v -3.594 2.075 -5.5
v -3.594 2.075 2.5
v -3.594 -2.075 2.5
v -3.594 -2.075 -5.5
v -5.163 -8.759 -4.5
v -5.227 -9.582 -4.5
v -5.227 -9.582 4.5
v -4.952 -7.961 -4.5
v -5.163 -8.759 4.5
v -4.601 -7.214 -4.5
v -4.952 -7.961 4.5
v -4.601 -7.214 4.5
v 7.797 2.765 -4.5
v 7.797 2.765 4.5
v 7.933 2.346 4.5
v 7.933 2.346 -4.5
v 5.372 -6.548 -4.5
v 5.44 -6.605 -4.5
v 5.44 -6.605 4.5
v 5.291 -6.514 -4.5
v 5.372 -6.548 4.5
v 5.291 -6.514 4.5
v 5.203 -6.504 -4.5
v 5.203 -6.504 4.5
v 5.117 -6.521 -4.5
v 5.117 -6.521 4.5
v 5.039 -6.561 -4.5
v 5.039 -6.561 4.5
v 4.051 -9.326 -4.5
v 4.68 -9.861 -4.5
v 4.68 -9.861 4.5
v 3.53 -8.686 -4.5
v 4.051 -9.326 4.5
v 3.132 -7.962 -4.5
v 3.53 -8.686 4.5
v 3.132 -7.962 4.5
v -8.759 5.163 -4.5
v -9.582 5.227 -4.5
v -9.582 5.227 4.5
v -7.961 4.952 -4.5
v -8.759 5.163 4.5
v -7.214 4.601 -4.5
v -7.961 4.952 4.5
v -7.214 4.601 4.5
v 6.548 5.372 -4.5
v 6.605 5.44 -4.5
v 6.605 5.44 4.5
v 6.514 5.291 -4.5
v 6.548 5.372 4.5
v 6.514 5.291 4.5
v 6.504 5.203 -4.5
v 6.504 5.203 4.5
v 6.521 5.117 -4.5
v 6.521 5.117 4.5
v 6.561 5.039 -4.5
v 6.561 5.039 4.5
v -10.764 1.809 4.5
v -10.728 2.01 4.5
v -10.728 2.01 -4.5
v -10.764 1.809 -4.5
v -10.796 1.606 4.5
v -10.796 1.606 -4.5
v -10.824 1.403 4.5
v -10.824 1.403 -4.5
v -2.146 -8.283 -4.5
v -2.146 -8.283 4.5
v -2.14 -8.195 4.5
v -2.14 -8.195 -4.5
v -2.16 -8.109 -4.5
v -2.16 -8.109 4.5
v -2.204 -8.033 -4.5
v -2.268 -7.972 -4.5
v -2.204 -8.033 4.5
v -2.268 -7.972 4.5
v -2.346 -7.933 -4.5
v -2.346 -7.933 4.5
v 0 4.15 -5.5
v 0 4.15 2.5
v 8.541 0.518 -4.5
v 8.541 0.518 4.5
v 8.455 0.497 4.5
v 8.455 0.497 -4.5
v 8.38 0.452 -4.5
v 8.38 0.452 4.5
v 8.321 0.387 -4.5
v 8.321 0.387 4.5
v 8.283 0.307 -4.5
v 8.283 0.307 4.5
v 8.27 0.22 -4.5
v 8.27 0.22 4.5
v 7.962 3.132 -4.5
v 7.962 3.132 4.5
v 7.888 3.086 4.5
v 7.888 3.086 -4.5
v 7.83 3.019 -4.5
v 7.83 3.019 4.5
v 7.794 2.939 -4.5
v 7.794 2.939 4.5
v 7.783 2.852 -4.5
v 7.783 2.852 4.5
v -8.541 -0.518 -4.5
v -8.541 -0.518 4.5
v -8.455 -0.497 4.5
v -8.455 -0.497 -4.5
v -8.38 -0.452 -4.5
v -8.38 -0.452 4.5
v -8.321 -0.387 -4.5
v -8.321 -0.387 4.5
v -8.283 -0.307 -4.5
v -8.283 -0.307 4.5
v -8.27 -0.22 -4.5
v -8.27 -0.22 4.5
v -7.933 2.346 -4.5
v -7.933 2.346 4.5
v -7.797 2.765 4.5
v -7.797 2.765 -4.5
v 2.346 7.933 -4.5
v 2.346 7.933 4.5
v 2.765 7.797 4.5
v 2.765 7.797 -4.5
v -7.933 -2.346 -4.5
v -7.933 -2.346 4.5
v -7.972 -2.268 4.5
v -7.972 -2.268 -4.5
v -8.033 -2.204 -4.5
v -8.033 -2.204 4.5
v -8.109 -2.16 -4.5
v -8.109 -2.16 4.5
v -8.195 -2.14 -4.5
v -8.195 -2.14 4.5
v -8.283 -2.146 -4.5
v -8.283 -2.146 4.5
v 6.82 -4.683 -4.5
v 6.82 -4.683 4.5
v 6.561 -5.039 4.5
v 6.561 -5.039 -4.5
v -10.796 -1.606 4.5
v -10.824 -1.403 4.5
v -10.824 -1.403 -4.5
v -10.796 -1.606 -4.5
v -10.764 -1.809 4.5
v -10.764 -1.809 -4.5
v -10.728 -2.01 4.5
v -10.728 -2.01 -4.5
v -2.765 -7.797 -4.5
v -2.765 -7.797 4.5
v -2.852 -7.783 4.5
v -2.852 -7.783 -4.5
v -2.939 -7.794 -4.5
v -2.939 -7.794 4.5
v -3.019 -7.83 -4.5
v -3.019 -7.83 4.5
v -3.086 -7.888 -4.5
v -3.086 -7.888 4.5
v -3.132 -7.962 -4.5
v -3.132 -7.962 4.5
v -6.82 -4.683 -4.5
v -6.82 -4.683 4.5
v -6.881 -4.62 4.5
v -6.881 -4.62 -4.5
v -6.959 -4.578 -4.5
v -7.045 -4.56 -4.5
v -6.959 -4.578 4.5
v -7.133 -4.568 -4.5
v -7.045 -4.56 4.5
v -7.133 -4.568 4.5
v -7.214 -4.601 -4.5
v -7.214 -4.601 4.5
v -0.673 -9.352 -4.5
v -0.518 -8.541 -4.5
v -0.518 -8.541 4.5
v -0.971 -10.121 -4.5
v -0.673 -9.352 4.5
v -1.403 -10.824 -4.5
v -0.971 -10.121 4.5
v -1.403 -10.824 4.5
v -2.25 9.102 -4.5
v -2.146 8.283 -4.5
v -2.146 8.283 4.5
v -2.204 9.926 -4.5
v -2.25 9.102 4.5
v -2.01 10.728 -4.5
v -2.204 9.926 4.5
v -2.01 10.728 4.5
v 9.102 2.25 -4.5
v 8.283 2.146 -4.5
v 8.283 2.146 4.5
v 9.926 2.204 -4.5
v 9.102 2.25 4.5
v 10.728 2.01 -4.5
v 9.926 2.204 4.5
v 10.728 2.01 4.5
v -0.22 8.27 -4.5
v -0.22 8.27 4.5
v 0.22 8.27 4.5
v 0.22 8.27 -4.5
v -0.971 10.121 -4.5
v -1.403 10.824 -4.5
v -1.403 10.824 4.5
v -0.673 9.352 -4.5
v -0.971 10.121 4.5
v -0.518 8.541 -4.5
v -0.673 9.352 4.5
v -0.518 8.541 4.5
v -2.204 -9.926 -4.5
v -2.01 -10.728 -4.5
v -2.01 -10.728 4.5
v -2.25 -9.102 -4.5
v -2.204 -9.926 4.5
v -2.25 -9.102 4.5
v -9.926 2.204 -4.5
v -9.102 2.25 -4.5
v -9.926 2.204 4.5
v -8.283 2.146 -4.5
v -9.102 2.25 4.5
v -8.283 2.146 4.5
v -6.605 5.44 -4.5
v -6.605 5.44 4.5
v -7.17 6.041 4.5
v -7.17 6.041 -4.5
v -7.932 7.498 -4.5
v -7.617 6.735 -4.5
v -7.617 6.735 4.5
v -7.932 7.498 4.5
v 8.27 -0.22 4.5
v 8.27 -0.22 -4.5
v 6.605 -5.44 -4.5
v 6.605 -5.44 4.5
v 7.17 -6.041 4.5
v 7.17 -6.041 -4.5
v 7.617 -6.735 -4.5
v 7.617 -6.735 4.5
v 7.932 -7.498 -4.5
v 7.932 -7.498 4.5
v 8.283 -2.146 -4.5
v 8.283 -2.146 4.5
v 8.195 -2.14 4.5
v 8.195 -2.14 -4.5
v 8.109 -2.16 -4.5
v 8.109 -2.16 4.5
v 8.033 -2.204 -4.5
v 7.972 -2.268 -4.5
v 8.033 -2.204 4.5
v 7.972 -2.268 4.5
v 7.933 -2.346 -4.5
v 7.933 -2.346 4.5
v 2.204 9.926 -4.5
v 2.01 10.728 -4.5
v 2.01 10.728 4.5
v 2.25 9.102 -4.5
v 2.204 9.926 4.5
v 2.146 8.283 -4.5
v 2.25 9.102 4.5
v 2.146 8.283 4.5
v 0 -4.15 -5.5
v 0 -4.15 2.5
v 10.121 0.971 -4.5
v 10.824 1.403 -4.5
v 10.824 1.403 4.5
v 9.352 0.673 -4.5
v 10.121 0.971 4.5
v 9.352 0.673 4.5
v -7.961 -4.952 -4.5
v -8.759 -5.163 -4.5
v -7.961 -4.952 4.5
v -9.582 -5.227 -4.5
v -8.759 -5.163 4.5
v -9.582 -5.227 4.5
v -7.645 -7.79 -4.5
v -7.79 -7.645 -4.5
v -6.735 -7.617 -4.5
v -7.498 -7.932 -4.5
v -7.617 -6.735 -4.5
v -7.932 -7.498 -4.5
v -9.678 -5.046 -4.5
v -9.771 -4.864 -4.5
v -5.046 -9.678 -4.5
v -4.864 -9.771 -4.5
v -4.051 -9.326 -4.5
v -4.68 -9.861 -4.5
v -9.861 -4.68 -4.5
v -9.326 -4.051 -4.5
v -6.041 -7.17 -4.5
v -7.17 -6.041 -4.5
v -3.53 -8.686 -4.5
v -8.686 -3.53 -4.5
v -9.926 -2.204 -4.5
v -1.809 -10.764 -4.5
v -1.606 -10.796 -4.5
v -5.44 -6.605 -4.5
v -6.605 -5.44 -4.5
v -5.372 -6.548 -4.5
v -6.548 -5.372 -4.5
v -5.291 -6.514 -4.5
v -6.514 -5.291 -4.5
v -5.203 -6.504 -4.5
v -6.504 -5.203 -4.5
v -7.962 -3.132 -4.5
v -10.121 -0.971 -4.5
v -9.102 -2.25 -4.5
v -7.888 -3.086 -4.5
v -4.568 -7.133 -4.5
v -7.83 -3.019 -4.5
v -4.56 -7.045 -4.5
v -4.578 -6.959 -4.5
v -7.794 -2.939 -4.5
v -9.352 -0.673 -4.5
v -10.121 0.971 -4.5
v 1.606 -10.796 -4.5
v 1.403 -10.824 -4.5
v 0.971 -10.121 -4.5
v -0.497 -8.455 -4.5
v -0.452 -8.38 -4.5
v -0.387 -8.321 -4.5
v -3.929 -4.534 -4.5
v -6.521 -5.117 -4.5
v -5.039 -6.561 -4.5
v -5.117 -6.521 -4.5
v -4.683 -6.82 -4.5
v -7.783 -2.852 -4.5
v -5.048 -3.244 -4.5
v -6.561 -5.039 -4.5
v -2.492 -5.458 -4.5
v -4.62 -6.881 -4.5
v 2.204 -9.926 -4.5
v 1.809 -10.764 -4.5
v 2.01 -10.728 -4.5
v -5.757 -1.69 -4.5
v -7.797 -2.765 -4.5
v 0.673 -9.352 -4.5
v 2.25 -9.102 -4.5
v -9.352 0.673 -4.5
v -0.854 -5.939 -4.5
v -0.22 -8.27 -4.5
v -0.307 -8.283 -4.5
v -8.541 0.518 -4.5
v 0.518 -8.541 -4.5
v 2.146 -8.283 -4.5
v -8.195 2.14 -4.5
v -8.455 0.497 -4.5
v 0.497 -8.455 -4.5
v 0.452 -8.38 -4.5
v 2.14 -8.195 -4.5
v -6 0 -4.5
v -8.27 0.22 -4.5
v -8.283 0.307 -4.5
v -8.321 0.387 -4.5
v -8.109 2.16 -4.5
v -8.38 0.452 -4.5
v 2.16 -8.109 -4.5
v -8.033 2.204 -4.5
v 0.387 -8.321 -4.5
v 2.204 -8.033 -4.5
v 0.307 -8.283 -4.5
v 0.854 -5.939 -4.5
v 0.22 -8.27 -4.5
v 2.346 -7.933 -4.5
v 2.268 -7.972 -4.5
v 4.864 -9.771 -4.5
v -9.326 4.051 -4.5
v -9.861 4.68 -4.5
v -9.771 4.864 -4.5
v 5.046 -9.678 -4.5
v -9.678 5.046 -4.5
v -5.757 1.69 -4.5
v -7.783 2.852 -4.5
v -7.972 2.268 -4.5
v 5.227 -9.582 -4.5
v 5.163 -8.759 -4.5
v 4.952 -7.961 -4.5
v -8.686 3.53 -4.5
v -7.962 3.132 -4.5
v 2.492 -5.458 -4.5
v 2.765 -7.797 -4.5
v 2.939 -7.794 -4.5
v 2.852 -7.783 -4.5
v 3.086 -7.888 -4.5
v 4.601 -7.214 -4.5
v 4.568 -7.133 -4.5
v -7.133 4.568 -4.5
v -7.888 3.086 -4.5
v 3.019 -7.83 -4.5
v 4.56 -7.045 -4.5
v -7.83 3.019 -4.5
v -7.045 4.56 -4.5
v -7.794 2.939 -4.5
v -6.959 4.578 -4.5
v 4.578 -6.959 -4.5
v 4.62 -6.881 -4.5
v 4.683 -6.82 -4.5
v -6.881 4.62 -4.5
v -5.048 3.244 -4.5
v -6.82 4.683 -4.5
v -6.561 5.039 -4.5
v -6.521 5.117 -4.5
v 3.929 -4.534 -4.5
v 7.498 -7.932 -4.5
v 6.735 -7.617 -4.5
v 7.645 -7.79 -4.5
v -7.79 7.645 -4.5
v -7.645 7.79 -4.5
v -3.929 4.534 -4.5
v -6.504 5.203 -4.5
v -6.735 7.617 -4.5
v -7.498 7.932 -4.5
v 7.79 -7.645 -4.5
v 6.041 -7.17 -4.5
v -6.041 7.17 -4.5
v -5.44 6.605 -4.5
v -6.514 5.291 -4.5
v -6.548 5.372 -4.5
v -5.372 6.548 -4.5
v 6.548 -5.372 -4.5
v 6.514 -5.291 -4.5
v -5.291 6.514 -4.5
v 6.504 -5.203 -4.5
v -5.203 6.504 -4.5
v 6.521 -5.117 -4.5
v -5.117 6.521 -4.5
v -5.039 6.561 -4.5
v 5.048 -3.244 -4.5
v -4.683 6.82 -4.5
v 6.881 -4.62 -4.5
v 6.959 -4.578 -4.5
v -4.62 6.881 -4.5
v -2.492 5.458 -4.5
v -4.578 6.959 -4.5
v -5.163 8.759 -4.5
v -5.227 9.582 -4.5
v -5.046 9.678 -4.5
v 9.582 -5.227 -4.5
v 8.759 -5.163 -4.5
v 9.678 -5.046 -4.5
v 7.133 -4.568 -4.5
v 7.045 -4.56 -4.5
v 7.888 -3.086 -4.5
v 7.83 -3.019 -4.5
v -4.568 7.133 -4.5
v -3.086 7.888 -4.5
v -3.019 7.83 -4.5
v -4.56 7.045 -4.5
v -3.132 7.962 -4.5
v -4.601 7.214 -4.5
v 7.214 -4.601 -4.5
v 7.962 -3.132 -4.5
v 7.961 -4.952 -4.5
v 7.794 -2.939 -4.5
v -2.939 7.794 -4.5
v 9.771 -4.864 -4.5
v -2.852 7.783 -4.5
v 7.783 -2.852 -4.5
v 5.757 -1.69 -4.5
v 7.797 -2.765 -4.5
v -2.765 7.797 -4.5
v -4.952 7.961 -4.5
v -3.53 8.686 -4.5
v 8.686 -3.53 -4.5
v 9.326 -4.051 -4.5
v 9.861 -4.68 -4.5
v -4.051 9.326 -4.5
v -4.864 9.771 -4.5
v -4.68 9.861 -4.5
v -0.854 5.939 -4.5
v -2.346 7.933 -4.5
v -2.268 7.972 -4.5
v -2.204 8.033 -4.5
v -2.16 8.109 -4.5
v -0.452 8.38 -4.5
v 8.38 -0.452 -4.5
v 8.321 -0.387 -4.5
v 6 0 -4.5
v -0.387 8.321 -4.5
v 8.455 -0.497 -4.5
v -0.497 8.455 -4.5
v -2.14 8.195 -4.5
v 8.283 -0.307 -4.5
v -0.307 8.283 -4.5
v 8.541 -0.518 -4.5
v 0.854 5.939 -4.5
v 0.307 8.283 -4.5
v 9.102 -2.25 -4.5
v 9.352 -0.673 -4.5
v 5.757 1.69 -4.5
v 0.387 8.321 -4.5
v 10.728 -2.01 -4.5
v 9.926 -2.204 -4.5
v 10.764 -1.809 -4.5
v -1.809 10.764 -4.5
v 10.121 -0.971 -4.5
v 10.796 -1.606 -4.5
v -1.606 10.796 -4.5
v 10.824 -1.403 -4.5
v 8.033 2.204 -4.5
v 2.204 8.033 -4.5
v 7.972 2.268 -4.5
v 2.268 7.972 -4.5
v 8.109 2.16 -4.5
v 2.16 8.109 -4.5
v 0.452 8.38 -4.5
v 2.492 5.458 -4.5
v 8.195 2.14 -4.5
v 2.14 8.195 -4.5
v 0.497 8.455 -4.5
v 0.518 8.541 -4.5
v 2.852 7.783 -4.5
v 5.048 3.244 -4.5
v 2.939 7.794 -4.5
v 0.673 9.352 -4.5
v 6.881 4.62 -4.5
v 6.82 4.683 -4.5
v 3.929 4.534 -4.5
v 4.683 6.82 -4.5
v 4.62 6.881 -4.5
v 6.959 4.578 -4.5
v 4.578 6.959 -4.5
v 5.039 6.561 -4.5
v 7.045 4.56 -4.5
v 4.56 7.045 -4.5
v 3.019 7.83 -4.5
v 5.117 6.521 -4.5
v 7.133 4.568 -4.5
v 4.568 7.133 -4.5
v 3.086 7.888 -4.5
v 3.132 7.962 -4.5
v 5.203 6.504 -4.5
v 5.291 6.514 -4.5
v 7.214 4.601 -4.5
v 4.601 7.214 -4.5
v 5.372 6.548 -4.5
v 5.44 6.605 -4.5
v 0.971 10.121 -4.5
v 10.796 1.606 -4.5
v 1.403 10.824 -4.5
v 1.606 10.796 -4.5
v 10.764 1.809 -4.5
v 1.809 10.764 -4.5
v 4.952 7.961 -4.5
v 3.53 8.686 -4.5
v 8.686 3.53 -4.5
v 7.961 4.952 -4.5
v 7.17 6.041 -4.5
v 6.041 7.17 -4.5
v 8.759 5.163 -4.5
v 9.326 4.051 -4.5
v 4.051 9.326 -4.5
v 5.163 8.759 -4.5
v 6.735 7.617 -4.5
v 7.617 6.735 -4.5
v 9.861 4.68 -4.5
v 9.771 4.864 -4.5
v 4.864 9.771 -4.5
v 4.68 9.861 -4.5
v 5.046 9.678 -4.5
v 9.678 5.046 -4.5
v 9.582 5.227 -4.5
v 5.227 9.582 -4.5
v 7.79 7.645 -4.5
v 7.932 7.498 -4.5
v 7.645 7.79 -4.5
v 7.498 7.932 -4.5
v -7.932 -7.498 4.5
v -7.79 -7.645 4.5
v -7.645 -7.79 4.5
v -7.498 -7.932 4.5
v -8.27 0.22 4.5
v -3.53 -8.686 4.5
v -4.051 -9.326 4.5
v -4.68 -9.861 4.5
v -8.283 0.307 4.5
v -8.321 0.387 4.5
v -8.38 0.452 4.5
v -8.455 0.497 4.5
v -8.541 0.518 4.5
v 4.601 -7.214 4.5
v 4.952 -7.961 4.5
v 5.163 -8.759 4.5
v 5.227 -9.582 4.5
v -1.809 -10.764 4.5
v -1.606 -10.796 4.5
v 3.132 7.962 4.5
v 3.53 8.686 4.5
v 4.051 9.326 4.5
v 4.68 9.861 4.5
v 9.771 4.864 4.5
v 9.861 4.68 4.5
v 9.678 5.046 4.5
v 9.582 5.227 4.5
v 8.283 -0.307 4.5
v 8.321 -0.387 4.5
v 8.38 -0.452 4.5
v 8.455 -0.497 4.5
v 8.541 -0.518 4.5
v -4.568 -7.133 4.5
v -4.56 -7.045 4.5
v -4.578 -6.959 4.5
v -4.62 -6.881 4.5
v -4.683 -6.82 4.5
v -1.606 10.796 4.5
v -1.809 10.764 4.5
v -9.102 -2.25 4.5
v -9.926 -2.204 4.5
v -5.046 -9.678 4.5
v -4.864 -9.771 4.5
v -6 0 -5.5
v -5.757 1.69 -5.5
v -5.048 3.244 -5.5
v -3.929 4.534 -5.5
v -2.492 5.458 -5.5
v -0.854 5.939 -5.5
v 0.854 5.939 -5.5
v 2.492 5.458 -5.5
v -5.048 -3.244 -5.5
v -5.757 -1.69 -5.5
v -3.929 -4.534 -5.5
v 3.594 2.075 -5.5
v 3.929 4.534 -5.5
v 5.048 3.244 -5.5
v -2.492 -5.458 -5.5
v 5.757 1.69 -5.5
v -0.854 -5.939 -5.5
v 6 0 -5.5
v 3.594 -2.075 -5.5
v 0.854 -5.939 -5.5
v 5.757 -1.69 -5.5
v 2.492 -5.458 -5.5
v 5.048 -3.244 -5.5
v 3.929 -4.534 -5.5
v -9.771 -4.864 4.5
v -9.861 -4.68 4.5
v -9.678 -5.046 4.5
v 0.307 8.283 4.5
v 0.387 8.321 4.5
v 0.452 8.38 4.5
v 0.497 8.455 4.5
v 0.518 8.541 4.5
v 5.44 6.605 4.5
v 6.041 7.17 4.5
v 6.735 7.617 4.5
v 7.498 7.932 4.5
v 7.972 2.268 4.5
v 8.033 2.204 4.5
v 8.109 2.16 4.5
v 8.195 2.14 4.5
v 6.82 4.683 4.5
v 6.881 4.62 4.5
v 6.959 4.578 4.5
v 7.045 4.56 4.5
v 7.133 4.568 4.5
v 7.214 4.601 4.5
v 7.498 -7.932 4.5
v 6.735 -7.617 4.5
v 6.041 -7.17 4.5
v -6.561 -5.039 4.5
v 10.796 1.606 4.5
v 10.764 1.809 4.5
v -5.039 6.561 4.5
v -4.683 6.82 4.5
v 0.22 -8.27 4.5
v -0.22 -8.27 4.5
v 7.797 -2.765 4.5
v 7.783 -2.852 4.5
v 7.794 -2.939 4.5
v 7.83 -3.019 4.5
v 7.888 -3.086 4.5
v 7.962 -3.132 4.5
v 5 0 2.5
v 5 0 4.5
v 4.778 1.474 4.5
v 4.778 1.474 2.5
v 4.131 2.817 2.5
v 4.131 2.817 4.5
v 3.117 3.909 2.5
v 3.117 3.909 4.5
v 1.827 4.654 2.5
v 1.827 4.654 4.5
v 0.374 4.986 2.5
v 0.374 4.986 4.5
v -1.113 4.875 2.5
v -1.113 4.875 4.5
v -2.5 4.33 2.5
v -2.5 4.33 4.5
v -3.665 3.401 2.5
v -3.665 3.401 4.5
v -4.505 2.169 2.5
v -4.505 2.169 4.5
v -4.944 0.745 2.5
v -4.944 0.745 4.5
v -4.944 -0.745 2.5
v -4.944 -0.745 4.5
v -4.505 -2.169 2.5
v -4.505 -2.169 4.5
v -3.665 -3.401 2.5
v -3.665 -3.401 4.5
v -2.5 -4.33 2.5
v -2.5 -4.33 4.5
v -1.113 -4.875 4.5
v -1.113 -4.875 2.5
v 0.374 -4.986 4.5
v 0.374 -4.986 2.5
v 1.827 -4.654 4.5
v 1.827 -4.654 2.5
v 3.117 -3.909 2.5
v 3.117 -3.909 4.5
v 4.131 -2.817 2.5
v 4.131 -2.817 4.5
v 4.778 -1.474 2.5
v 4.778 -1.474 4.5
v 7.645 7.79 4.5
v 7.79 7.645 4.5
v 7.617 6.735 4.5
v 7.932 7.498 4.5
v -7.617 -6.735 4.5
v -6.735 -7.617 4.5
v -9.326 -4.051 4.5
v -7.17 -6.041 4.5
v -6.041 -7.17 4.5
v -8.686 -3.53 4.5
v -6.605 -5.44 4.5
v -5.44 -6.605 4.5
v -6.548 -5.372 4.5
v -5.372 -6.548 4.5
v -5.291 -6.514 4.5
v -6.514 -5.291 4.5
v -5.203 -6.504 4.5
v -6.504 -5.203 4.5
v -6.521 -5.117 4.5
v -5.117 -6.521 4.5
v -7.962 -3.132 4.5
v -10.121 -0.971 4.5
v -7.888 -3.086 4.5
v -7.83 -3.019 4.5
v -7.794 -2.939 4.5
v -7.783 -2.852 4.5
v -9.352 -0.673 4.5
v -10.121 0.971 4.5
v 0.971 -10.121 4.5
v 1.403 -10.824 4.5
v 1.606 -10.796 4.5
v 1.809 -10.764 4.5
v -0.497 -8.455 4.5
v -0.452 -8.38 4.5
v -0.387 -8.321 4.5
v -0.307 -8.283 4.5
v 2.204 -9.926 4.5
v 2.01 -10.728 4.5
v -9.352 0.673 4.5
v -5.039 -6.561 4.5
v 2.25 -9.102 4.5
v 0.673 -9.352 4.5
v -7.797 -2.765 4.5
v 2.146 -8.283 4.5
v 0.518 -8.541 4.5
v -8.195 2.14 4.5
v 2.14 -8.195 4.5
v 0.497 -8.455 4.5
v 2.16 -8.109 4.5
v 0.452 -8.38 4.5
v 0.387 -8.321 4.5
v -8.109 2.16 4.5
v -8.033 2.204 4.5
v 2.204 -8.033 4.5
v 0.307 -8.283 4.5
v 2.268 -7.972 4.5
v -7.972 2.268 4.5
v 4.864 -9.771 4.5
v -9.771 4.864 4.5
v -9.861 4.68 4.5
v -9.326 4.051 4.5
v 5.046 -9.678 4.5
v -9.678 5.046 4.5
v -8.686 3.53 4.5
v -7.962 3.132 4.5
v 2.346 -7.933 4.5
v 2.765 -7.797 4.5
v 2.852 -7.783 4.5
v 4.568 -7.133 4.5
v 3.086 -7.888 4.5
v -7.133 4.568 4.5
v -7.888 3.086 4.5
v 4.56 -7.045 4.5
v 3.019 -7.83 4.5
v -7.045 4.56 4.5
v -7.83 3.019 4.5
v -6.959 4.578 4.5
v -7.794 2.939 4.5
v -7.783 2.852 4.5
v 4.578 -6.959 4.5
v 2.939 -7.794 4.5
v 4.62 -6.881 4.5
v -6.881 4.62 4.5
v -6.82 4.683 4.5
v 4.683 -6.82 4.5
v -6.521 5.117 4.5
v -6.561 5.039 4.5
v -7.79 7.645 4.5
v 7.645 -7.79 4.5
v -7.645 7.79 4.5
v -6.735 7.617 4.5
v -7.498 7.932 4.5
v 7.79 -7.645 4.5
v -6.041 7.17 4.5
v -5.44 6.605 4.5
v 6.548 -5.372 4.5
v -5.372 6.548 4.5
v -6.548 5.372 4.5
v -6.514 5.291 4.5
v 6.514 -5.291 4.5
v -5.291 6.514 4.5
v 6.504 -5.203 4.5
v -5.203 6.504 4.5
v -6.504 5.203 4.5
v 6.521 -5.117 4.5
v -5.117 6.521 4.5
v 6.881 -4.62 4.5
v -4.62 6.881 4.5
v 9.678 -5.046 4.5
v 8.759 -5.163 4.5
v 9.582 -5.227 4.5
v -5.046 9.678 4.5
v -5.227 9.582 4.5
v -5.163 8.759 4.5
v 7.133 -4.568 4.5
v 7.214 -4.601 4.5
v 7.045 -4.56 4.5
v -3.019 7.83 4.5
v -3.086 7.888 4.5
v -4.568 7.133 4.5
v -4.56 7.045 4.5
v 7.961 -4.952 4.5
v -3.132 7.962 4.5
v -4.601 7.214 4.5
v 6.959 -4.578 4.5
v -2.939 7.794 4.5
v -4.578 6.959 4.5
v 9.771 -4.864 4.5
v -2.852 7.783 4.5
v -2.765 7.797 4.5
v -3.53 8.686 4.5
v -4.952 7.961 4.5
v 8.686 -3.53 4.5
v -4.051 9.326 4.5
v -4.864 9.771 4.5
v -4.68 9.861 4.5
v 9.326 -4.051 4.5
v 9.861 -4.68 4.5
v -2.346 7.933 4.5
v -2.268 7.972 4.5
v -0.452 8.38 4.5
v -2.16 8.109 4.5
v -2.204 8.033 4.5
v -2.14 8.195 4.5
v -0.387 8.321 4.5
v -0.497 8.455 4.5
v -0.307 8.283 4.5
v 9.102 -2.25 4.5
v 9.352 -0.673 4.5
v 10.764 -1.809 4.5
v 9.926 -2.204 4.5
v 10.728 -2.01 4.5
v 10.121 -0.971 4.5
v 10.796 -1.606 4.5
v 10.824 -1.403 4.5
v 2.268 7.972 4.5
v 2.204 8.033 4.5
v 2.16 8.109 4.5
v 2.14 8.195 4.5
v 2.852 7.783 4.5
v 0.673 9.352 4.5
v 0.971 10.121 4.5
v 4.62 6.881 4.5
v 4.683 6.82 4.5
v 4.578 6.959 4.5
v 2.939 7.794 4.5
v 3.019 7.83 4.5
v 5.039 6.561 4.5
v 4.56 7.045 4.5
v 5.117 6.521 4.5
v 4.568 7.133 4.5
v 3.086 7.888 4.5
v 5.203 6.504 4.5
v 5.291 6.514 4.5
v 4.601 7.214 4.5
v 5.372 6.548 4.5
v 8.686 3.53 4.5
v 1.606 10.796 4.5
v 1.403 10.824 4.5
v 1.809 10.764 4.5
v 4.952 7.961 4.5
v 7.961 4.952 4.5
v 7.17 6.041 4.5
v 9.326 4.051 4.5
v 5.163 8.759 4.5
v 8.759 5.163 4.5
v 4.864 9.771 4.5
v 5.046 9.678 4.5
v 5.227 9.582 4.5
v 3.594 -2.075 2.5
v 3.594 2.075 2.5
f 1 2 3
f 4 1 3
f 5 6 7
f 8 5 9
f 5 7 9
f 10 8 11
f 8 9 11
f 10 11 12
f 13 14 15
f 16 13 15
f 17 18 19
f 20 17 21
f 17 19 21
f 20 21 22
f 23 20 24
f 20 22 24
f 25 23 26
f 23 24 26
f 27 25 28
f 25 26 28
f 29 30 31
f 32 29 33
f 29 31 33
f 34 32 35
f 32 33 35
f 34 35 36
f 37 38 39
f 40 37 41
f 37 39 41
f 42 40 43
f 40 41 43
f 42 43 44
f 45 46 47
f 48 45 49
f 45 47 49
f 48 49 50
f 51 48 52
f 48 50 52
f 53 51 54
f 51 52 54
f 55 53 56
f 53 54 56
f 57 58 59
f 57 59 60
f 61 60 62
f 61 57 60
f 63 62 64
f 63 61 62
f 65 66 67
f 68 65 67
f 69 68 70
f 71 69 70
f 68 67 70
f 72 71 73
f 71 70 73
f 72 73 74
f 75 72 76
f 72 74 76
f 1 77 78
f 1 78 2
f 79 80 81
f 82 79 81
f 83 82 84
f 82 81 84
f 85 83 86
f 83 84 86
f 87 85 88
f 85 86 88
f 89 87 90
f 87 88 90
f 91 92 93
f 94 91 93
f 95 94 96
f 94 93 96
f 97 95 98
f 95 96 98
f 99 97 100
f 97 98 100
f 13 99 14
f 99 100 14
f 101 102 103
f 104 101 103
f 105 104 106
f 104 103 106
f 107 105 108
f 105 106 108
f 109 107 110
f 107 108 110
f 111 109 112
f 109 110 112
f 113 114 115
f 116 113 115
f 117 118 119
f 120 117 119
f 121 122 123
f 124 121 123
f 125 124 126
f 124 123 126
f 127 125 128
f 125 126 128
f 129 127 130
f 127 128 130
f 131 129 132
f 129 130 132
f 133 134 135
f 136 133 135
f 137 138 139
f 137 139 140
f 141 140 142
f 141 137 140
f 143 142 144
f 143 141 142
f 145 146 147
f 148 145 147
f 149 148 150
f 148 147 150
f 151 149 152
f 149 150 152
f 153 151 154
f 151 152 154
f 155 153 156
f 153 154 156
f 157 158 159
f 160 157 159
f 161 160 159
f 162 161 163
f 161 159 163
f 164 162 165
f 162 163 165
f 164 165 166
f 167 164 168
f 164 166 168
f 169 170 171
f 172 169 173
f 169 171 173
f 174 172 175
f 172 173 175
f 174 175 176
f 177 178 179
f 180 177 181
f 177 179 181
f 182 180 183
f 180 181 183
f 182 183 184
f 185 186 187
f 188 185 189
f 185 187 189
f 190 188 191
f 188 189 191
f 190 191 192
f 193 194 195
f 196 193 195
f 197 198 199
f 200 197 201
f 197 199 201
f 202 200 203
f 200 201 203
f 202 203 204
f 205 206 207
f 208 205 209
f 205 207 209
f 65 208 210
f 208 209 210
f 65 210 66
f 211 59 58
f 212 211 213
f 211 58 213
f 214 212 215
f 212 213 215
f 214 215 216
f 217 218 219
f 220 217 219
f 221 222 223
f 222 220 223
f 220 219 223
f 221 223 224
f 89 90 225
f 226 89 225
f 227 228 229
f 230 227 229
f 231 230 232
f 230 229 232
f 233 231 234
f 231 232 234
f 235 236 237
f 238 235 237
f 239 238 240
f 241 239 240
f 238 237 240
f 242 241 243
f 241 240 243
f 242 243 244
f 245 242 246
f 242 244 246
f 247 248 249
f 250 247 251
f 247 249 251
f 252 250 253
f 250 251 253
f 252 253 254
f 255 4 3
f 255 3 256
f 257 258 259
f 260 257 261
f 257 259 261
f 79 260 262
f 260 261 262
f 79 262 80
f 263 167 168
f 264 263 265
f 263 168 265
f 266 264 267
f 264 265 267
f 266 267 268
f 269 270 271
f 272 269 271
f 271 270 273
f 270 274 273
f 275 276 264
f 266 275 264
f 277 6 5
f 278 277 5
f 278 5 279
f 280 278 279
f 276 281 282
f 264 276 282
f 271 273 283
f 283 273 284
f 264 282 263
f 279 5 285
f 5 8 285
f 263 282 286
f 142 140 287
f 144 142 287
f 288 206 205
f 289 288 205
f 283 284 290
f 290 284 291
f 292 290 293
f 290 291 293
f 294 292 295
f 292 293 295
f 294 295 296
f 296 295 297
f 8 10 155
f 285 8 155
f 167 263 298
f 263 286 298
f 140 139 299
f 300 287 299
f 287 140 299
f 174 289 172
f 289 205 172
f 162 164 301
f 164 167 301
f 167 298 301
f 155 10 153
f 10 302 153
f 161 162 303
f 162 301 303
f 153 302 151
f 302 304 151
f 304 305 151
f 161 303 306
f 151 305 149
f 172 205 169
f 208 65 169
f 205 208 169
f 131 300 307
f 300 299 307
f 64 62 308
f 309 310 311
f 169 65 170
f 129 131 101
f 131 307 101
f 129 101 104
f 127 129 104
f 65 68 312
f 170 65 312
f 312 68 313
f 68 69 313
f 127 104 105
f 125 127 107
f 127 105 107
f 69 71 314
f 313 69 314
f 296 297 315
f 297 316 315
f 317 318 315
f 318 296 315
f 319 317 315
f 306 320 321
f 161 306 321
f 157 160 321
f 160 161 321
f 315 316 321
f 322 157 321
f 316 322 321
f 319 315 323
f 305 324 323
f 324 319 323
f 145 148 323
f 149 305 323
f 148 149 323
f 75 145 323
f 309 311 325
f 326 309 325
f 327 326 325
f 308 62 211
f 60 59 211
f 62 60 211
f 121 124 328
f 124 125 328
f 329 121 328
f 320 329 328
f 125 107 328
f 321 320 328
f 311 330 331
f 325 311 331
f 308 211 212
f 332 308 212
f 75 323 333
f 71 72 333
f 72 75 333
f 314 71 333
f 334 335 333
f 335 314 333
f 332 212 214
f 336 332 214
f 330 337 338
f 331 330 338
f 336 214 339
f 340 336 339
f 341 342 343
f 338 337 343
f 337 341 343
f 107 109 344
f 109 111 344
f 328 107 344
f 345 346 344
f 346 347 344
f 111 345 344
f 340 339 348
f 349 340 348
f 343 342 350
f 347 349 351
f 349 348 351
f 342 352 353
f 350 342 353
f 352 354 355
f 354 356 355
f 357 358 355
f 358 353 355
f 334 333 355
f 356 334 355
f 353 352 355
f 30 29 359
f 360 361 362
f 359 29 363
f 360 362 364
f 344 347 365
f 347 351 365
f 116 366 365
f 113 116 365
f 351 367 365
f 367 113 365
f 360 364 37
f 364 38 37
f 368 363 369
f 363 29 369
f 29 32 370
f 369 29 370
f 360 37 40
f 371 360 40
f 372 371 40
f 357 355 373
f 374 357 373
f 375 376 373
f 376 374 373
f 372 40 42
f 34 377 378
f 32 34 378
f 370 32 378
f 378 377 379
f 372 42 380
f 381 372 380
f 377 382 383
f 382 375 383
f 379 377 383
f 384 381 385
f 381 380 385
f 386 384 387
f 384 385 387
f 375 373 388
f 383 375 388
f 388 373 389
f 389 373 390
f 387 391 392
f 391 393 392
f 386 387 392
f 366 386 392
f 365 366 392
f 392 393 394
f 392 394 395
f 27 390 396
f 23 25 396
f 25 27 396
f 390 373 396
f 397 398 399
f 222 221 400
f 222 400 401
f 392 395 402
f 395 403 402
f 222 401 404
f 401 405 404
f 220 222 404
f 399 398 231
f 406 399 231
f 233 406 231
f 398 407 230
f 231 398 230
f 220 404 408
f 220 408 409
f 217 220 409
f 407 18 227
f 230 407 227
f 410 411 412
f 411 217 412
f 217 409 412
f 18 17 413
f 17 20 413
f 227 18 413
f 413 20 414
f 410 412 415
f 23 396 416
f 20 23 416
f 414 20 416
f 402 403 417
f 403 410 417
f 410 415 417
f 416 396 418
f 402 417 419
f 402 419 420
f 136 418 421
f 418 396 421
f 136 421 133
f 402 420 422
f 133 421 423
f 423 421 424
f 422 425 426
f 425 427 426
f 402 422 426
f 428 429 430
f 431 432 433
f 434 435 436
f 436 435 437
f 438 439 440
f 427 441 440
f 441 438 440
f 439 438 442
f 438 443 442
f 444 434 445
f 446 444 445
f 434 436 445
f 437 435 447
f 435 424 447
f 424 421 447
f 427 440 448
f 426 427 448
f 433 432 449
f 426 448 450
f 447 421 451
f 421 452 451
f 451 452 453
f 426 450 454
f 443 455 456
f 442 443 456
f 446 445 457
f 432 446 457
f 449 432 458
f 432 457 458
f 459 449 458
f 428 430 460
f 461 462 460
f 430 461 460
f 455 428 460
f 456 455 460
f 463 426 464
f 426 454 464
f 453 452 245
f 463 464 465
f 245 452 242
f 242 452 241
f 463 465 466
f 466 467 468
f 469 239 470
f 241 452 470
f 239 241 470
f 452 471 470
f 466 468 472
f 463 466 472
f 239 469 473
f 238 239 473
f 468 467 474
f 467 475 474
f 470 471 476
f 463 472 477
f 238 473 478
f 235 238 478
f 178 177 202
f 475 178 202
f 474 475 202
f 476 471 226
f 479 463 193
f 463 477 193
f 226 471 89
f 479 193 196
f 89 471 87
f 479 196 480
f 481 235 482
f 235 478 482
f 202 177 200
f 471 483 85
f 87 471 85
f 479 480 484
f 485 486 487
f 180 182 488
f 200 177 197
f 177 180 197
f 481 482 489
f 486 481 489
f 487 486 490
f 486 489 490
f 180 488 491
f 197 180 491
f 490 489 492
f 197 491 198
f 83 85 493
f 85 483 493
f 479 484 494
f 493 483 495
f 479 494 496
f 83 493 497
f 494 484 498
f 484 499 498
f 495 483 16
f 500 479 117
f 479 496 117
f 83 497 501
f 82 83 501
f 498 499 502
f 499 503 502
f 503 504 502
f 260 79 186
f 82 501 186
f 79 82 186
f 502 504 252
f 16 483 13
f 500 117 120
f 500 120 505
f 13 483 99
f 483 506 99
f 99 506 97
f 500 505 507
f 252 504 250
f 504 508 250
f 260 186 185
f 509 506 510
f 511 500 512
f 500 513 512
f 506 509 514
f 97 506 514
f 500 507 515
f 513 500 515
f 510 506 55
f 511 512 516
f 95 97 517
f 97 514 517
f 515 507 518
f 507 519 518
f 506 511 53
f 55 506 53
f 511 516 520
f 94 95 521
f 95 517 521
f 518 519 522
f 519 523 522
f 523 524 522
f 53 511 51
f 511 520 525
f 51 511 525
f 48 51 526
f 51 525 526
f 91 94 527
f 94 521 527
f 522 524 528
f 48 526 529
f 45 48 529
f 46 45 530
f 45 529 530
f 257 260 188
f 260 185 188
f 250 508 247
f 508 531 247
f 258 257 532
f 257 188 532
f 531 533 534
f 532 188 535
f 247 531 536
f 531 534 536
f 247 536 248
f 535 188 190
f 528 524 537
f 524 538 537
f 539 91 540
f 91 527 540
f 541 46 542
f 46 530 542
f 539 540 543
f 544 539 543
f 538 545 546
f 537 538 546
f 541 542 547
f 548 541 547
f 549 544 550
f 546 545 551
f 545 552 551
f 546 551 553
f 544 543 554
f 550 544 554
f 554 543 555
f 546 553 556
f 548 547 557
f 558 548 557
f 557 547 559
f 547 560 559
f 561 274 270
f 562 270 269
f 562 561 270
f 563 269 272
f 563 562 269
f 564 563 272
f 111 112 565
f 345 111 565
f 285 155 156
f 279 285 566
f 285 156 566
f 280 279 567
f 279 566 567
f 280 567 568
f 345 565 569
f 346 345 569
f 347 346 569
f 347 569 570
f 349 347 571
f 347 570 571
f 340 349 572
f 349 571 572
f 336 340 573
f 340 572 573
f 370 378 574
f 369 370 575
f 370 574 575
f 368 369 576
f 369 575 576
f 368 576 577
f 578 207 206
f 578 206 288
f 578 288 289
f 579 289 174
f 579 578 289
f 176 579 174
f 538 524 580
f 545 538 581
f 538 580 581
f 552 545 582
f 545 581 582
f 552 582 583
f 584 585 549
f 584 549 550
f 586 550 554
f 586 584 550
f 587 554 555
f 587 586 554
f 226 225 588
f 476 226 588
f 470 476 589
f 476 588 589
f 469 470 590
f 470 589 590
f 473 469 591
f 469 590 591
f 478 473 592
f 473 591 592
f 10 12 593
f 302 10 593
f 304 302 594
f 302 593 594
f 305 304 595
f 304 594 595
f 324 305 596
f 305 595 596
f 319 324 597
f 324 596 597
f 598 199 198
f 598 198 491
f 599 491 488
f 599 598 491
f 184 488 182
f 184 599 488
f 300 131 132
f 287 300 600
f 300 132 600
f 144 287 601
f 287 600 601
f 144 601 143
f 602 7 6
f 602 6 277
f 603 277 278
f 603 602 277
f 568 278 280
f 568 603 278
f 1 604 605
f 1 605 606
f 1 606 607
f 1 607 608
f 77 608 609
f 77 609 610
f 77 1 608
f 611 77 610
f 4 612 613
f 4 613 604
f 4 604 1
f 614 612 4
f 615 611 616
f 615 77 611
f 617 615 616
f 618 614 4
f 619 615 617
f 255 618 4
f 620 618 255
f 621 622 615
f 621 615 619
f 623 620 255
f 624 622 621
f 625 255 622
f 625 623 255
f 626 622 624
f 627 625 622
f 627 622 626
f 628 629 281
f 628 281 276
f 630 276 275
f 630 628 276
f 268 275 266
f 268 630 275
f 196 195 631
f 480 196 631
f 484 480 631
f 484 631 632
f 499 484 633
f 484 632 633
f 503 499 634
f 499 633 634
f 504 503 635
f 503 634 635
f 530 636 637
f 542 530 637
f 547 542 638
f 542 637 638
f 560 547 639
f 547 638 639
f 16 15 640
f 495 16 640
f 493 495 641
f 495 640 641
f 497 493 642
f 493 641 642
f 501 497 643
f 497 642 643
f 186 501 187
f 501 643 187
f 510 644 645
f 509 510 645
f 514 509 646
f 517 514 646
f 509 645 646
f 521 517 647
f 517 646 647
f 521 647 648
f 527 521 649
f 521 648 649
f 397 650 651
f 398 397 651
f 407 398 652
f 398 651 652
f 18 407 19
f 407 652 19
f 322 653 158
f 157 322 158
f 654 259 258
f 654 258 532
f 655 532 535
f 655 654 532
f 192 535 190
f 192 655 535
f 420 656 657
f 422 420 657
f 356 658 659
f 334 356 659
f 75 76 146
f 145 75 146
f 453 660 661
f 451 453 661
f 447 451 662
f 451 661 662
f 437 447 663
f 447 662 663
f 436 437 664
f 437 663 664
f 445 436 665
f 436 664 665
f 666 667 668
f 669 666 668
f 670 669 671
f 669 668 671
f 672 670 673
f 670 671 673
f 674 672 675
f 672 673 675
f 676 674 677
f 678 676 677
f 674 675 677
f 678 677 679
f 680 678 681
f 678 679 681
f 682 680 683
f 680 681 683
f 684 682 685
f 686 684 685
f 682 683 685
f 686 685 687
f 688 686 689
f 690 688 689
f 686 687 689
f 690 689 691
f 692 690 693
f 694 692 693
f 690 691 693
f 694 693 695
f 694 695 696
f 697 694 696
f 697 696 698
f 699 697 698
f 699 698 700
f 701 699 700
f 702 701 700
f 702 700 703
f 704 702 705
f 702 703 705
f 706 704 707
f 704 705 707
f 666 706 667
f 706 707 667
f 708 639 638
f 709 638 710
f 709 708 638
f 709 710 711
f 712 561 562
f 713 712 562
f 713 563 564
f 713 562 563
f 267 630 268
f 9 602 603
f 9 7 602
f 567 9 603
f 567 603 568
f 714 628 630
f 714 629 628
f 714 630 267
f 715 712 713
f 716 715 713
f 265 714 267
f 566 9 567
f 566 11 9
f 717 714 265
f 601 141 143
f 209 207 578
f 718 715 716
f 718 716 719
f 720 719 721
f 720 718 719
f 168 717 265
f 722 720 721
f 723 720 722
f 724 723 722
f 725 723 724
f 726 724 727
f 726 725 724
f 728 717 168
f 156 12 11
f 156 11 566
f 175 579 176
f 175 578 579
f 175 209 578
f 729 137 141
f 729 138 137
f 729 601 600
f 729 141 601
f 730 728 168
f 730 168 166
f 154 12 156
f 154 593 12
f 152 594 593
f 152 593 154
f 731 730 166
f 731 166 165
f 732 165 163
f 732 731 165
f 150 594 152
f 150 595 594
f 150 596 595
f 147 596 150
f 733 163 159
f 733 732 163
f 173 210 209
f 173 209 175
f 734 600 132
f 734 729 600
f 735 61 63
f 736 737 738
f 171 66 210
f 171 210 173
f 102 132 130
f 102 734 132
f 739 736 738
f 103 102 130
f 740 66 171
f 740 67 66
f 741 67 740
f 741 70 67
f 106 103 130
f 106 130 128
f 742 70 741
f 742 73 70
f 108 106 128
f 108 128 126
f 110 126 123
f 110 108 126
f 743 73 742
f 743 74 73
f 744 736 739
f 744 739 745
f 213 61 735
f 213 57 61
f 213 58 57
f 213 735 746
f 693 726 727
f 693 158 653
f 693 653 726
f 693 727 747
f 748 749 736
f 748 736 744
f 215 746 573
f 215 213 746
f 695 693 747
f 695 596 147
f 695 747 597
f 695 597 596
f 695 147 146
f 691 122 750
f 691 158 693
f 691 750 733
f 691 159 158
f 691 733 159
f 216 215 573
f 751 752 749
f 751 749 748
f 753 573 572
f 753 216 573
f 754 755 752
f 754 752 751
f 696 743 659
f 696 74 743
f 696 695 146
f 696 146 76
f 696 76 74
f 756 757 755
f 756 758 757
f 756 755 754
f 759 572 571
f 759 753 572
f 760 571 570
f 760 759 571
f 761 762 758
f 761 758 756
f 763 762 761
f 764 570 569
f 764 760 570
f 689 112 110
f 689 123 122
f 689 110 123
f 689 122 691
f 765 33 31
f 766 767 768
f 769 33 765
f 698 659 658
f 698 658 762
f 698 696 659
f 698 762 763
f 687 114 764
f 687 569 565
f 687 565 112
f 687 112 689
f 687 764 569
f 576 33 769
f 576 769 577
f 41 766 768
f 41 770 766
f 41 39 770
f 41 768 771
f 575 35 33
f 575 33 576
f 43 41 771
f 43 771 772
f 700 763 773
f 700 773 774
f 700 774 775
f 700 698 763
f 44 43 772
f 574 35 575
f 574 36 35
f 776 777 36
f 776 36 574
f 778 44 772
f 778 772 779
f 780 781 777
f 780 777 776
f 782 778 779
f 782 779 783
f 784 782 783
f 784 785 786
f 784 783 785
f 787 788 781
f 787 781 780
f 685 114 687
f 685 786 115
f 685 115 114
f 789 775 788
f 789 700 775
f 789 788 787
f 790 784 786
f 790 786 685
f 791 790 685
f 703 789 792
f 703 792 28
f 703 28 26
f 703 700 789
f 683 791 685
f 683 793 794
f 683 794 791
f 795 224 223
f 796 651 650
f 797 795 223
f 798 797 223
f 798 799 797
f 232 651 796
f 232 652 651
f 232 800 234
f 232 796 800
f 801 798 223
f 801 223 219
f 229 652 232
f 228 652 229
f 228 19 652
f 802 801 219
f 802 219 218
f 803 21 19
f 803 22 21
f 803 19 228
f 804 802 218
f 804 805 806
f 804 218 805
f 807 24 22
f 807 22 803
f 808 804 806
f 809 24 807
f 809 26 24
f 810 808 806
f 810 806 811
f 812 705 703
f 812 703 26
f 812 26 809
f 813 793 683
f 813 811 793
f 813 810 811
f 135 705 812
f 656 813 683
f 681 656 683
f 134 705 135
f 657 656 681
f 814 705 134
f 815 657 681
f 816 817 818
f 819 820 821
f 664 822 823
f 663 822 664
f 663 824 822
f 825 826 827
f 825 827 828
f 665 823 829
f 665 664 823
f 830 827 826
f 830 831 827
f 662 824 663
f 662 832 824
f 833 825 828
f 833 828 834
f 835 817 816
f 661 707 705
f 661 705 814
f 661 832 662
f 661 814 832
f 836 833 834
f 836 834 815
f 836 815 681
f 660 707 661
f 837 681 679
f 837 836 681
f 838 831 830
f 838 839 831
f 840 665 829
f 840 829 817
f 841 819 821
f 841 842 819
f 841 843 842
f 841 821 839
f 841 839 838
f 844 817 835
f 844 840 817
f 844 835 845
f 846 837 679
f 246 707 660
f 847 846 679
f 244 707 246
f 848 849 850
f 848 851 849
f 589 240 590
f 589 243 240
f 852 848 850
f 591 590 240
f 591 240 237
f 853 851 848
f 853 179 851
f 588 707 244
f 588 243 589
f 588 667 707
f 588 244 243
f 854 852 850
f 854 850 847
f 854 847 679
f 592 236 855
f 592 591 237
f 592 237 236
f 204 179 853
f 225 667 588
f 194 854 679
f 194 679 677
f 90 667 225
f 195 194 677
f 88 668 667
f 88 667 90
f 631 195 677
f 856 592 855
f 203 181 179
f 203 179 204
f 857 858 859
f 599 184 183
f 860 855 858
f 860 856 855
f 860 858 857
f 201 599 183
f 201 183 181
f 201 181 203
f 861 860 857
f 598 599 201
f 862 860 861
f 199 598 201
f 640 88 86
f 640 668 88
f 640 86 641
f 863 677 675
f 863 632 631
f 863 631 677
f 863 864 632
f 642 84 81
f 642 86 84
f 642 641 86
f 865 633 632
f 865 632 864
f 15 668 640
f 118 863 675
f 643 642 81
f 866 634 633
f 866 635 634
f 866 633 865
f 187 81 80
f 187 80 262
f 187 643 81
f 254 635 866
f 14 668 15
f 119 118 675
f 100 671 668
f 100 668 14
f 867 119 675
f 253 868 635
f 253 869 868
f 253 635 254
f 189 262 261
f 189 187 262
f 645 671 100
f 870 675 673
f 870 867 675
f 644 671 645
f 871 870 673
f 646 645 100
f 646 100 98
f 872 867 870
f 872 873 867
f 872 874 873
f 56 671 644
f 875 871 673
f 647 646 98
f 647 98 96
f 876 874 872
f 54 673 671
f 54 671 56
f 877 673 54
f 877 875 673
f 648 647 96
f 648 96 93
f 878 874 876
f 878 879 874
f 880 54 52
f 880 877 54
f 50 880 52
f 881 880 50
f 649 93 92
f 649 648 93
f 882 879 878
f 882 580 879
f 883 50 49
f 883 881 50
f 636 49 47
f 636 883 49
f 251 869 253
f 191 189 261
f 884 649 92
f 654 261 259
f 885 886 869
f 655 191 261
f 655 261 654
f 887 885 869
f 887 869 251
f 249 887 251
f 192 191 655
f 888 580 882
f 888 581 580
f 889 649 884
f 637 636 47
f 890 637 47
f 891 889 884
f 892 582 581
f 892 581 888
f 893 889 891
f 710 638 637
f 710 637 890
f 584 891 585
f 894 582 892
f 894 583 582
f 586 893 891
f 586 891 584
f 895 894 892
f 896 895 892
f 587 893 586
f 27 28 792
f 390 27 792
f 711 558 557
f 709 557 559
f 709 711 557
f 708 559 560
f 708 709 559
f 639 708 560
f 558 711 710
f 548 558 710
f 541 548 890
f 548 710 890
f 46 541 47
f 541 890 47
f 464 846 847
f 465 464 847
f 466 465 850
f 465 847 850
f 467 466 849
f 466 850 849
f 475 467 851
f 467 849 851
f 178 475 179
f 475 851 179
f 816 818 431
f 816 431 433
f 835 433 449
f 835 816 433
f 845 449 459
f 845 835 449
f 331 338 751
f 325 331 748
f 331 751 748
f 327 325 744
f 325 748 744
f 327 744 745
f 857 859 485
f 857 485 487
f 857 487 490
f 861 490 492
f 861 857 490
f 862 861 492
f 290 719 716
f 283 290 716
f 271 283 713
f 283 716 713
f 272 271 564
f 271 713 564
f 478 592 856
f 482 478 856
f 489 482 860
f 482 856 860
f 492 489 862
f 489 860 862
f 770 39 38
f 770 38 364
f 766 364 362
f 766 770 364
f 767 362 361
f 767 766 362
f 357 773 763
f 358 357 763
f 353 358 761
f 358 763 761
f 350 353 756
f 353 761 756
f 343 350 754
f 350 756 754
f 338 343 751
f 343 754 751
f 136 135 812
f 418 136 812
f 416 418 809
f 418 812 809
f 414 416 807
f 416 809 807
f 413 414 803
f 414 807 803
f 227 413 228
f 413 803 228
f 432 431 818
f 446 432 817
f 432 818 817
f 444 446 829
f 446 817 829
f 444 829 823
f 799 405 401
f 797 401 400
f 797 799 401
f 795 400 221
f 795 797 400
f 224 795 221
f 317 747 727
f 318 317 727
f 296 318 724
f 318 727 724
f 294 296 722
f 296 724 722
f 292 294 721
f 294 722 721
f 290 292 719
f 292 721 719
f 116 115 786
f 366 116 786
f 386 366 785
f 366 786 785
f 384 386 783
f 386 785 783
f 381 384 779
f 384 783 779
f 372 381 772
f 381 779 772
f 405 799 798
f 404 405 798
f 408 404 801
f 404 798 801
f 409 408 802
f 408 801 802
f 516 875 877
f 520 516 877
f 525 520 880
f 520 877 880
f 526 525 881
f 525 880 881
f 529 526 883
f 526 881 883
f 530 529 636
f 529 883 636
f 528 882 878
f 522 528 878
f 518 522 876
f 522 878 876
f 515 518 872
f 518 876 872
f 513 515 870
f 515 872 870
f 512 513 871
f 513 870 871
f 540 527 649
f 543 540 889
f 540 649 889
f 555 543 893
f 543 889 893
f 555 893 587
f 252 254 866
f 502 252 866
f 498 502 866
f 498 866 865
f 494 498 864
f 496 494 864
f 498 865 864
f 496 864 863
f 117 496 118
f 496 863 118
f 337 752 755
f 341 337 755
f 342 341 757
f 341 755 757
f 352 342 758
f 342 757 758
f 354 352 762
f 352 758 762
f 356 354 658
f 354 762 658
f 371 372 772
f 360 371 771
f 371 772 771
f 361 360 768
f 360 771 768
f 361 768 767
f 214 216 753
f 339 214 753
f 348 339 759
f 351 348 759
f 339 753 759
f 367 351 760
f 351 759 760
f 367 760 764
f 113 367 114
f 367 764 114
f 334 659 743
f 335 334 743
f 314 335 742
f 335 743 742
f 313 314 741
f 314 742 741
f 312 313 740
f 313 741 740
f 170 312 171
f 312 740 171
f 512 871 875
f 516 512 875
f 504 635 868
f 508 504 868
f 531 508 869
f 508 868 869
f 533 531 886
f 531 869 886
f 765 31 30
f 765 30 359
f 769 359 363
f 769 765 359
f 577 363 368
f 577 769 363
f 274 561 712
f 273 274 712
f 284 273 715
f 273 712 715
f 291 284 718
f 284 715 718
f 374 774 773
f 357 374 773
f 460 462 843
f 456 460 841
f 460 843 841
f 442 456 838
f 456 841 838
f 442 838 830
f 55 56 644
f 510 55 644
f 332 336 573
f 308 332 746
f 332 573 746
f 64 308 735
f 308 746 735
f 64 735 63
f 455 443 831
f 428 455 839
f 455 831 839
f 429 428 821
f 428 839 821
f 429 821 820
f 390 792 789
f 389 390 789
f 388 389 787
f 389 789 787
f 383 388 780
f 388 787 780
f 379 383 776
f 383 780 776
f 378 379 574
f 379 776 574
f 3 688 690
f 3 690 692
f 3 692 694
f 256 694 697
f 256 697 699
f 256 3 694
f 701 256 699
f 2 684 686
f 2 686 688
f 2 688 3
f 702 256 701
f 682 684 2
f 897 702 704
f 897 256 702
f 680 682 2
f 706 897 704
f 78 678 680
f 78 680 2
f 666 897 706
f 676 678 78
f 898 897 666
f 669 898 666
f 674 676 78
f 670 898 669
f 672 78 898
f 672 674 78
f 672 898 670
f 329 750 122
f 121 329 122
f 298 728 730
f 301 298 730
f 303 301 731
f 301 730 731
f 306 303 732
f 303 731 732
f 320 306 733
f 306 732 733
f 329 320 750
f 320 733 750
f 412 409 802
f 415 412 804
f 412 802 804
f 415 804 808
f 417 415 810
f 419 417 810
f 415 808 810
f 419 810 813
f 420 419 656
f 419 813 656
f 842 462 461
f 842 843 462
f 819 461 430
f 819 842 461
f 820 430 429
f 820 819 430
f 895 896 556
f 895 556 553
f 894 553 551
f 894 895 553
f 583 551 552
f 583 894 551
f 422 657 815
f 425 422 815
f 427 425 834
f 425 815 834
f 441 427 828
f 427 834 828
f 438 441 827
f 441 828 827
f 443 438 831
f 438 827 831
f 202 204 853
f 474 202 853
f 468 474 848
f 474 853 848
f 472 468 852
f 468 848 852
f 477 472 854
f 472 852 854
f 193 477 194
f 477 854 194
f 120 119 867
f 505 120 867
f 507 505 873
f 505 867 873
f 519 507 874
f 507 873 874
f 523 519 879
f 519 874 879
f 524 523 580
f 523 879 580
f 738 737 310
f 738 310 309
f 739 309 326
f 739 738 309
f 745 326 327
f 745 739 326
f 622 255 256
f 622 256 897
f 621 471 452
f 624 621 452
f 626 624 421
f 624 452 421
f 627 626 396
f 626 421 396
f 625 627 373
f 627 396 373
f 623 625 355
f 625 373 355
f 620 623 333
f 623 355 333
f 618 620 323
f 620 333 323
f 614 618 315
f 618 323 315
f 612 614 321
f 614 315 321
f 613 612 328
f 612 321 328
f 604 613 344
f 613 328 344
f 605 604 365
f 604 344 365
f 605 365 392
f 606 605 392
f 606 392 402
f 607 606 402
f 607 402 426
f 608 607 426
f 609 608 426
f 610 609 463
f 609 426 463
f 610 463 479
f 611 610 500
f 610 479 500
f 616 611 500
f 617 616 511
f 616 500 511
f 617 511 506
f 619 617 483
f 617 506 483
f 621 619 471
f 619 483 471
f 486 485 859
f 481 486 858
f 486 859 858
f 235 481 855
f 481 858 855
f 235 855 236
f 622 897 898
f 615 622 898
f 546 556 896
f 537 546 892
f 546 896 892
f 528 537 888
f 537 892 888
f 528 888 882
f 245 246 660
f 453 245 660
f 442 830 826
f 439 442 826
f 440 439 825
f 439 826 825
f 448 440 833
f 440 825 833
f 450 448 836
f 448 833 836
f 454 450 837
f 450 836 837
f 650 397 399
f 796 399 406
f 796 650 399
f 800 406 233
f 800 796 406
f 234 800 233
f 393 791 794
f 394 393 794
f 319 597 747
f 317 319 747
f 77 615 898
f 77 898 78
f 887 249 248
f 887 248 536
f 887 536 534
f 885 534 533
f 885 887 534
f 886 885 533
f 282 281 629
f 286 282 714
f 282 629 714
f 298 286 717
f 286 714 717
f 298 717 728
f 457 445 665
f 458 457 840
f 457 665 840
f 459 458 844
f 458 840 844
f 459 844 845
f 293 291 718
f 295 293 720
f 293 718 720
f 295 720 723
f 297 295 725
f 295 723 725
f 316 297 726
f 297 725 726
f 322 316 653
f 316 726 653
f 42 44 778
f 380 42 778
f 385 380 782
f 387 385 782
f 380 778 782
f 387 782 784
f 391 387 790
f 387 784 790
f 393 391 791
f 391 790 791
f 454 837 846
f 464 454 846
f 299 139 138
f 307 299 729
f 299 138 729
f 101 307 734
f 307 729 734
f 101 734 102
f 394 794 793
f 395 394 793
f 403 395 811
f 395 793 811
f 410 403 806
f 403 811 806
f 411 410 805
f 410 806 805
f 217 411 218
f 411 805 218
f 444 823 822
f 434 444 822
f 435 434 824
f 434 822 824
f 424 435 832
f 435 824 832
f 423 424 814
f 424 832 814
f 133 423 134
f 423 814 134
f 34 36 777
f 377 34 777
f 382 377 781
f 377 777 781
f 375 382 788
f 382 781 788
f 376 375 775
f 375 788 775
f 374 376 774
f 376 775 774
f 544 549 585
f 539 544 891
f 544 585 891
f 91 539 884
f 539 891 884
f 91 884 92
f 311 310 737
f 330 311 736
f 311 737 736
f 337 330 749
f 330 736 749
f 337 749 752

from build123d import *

# Parameters (mm, degrees)
SKIZZE1_R                       = 10.915
AUFSATZ_LINEAR_AUSTRAGEN1_DEPTH = 4.5
SKIZZE4_R                       = 5
SKIZZE4_R_2                     = 2.5
SCHNITT_LINEAR_AUSTRAGEN2_DEPTH = 2
SCHNITT_LINEAR_AUSTRAGEN3_DEPTH = 18.868252573
KREISMUSTER1_COUNT              = 20
SKIZZE8_R                       = 6
AUFSATZ_LINEAR_AUSTRAGEN2_DEPTH = 1
SCHNITT_LINEAR_AUSTRAGEN4_DEPTH = 19.284854719


with BuildPart() as part:
    # Skizze1 → Aufsatz-Linear austragen1 (new, symmetric)
    with BuildSketch(Plane.XY):
        Circle(SKIZZE1_R)
    extrude(amount=AUFSATZ_LINEAR_AUSTRAGEN1_DEPTH, both=True)

    # Skizze4 → Schnitt-Linear austragen2 (cut)
    with BuildSketch(Plane.XY.offset(4.5)):
        Circle(SKIZZE4_R)
        Circle(SKIZZE4_R_2, mode=Mode.SUBTRACT)
    extrude(amount=-SCHNITT_LINEAR_AUSTRAGEN2_DEPTH, mode=Mode.SUBTRACT)

    # Skizze6 → Schnitt-Linear austragen3 (cut, through all)
    with BuildSketch(Plane.XY.offset(4.5)):
        with BuildLine():
            Line((-0.219874756, 8.27), (0.219874756, 8.27))
            ThreePointArc((0.219874756, 8.27), (0.421386888, 8.347754953), (0.518441911, 8.540714262))
            ThreePointArc((0.518441911, 8.540714262), (1.009154991, 10.195876188), (2.08, 11.55))
            ThreePointArc((2.08, 11.55), (0, 11.670581665), (-2.08, 11.55))
            ThreePointArc((-2.08, 11.55), (-1.009154991, 10.195876188), (-0.518441911, 8.540714262))
            ThreePointArc((-0.518441911, 8.540714262), (-0.421386888, 8.347754953), (-0.219874756, 8.27))
        make_face()
    schnitt_linear_austragen3 = extrude(amount=-SCHNITT_LINEAR_AUSTRAGEN3_DEPTH, mode=Mode.SUBTRACT)

    # Kreismuster1: Schnitt-Linear austragen3 ×20 about axis
    kreismuster1_axis = Axis((0, 0, 0), (0, 0, 1))
    for i in range(1, KREISMUSTER1_COUNT):
        add(schnitt_linear_austragen3.rotate(kreismuster1_axis, i * 360 / KREISMUSTER1_COUNT), mode=Mode.SUBTRACT)

    # Skizze8 → Aufsatz-Linear austragen2 (add)
    with BuildSketch(Plane(origin=(0, 0, -4.5), x_dir=(-1, 0, 0), z_dir=(0, 0, -1))):
        with Locations(Location((0, 0, 0), (0, 0, 180))):
            Circle(SKIZZE8_R)
    extrude(amount=AUFSATZ_LINEAR_AUSTRAGEN2_DEPTH)

    # Skizze7 → Schnitt-Linear austragen4 (cut, through all)
    with BuildSketch(Plane.XY.offset(4.5)):
        Polygon((0, 4.15), (-3.594005426, 2.075), (-3.594005426, -2.075), (0, -4.15), (3.594005426, -2.075), (3.594005426, 2.075), align=None)
    extrude(amount=-SCHNITT_LINEAR_AUSTRAGEN4_DEPTH, mode=Mode.SUBTRACT)


solid = part.part
